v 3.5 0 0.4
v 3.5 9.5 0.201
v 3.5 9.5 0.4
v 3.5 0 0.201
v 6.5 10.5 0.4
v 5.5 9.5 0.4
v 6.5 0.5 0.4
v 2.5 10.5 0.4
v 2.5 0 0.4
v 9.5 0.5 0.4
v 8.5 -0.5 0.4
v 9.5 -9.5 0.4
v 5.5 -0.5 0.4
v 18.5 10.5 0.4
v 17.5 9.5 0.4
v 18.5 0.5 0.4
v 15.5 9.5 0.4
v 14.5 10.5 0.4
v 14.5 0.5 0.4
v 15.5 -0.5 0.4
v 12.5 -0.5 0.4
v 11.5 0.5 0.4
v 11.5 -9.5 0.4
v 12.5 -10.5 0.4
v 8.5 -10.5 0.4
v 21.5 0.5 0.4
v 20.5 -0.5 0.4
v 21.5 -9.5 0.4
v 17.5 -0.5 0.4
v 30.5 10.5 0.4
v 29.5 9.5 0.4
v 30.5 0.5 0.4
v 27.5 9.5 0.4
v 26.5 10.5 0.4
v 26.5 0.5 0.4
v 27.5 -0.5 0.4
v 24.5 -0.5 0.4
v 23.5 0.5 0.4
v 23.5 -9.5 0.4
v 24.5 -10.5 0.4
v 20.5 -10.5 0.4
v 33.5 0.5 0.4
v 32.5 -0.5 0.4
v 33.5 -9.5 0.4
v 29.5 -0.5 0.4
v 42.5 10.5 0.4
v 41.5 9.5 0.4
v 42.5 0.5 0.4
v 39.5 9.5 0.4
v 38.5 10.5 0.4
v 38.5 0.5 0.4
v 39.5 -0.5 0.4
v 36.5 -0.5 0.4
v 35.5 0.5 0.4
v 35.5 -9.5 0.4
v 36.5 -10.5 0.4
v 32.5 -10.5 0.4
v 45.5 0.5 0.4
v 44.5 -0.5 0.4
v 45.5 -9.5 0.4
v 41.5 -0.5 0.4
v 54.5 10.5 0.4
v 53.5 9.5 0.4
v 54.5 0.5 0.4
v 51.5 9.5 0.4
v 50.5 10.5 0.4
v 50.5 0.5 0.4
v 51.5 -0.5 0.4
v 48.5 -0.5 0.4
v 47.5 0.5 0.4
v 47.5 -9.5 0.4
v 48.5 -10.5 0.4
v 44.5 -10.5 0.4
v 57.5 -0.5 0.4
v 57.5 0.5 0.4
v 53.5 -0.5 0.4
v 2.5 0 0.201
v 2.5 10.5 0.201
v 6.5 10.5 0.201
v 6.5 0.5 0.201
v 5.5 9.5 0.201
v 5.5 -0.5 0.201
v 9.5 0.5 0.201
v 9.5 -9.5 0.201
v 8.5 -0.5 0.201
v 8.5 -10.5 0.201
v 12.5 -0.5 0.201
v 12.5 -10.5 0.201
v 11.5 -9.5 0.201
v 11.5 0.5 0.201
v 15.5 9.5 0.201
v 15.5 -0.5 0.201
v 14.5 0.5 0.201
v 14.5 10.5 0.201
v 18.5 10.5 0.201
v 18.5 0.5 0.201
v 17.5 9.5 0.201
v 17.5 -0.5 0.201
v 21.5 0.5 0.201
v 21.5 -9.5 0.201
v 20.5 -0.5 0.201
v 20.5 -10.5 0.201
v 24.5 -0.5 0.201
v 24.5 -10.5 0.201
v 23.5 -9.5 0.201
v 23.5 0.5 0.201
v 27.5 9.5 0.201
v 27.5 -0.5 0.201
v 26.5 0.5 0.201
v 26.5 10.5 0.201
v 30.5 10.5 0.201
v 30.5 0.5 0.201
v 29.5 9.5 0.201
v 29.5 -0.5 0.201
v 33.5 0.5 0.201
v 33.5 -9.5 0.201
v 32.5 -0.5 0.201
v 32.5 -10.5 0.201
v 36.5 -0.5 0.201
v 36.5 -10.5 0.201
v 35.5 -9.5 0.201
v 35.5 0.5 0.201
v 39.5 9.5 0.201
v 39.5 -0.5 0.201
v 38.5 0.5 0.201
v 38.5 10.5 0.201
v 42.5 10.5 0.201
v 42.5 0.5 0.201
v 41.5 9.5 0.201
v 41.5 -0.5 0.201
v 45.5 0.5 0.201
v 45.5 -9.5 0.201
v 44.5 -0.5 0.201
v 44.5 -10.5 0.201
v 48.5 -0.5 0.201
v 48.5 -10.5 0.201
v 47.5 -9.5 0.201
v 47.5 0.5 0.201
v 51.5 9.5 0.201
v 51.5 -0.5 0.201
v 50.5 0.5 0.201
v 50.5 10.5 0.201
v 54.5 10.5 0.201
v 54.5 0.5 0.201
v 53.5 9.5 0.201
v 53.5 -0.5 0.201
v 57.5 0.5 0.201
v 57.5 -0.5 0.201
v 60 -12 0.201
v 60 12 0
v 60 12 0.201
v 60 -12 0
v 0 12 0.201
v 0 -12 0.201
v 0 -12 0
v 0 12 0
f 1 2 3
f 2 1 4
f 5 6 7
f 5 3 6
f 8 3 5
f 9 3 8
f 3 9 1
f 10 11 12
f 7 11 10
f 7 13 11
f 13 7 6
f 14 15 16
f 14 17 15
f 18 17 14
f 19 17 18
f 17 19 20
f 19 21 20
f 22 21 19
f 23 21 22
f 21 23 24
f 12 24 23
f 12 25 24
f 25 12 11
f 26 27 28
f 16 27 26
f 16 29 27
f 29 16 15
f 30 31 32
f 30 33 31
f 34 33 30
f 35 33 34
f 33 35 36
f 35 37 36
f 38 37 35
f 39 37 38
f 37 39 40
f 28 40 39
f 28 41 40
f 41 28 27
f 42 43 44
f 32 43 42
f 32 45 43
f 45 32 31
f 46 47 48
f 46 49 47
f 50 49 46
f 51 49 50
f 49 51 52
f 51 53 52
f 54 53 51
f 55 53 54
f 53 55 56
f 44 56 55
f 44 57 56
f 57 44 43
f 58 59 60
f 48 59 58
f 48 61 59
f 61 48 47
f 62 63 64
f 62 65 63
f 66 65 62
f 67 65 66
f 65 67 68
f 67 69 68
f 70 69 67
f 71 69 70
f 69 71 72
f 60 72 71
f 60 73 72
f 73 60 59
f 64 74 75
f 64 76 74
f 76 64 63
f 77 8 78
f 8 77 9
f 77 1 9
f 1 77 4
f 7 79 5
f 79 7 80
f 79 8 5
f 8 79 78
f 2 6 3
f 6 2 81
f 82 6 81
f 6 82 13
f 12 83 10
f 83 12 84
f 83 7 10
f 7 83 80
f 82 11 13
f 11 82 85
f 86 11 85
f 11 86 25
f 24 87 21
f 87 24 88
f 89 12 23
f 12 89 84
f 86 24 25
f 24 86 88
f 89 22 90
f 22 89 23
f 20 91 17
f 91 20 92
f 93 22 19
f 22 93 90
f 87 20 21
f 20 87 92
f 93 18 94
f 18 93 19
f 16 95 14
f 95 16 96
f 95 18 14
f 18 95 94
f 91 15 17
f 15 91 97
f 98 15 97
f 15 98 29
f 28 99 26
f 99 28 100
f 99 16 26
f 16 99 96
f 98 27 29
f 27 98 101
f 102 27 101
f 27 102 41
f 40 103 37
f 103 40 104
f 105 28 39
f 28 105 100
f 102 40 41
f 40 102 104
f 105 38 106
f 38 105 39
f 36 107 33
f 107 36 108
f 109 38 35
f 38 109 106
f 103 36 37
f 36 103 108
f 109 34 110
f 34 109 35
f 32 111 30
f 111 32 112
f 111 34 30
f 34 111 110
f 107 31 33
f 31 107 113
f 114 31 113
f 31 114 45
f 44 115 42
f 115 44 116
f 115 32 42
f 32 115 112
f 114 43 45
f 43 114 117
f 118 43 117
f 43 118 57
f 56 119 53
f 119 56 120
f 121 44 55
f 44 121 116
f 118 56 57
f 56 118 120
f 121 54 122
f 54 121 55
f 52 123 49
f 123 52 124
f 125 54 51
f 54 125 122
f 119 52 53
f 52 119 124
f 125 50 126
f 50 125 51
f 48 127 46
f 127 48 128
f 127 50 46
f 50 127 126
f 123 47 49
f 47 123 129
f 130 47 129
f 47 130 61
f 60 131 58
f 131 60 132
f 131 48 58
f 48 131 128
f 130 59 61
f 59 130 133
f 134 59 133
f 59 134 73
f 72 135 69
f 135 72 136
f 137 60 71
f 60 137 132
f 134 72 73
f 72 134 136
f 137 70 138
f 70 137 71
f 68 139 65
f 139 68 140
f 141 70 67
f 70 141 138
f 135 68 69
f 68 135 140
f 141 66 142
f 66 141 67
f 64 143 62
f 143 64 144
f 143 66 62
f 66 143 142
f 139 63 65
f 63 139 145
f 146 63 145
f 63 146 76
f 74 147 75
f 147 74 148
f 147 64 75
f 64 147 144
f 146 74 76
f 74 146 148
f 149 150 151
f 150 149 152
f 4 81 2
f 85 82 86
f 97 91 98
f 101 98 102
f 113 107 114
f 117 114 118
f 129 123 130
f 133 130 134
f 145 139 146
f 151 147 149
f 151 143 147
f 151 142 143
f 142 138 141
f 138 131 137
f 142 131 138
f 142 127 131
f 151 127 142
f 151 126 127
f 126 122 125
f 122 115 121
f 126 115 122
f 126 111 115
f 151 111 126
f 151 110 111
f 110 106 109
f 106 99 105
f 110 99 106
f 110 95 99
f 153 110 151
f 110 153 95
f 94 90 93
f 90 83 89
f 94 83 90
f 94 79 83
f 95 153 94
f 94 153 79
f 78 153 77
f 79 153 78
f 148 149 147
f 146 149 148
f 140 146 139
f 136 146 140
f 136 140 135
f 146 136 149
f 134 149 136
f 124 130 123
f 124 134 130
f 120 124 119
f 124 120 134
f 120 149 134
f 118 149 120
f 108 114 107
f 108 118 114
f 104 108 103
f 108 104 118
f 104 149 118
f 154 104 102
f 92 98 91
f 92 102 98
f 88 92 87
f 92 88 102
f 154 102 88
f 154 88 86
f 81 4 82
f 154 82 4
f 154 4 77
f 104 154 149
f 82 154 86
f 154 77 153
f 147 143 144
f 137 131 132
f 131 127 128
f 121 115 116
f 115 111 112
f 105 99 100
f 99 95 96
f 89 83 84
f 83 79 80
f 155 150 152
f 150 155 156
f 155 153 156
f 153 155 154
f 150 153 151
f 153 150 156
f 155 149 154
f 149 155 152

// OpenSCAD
w = 1; 
xstep = 3;
ystep = 10;
base_height=0.2;
snake_height=0.2;

module vline(i) {
  x = i * xstep;
  
    dy = (i % 4) >= 2 ? -ystep : 0;
    translate([x-w/2, dy, 0])
      cube([w, ystep, snake_height]);
}

module hline(i) {
  x = i * xstep;
  
   dy = [ystep, 0, -ystep, 0][(i % 4)];
  translate([x-w/2, dy-w/2, 0])
    cube([xstep+w, w, snake_height]);  
}

module snake() {
for(i = [0:17]) {
  vline(i);
  hline(i);
}
}

translate([3, 0, base_height])
#snake();

translate([0, -12, 0])
cube([60, 24, base_height+0.001]);
